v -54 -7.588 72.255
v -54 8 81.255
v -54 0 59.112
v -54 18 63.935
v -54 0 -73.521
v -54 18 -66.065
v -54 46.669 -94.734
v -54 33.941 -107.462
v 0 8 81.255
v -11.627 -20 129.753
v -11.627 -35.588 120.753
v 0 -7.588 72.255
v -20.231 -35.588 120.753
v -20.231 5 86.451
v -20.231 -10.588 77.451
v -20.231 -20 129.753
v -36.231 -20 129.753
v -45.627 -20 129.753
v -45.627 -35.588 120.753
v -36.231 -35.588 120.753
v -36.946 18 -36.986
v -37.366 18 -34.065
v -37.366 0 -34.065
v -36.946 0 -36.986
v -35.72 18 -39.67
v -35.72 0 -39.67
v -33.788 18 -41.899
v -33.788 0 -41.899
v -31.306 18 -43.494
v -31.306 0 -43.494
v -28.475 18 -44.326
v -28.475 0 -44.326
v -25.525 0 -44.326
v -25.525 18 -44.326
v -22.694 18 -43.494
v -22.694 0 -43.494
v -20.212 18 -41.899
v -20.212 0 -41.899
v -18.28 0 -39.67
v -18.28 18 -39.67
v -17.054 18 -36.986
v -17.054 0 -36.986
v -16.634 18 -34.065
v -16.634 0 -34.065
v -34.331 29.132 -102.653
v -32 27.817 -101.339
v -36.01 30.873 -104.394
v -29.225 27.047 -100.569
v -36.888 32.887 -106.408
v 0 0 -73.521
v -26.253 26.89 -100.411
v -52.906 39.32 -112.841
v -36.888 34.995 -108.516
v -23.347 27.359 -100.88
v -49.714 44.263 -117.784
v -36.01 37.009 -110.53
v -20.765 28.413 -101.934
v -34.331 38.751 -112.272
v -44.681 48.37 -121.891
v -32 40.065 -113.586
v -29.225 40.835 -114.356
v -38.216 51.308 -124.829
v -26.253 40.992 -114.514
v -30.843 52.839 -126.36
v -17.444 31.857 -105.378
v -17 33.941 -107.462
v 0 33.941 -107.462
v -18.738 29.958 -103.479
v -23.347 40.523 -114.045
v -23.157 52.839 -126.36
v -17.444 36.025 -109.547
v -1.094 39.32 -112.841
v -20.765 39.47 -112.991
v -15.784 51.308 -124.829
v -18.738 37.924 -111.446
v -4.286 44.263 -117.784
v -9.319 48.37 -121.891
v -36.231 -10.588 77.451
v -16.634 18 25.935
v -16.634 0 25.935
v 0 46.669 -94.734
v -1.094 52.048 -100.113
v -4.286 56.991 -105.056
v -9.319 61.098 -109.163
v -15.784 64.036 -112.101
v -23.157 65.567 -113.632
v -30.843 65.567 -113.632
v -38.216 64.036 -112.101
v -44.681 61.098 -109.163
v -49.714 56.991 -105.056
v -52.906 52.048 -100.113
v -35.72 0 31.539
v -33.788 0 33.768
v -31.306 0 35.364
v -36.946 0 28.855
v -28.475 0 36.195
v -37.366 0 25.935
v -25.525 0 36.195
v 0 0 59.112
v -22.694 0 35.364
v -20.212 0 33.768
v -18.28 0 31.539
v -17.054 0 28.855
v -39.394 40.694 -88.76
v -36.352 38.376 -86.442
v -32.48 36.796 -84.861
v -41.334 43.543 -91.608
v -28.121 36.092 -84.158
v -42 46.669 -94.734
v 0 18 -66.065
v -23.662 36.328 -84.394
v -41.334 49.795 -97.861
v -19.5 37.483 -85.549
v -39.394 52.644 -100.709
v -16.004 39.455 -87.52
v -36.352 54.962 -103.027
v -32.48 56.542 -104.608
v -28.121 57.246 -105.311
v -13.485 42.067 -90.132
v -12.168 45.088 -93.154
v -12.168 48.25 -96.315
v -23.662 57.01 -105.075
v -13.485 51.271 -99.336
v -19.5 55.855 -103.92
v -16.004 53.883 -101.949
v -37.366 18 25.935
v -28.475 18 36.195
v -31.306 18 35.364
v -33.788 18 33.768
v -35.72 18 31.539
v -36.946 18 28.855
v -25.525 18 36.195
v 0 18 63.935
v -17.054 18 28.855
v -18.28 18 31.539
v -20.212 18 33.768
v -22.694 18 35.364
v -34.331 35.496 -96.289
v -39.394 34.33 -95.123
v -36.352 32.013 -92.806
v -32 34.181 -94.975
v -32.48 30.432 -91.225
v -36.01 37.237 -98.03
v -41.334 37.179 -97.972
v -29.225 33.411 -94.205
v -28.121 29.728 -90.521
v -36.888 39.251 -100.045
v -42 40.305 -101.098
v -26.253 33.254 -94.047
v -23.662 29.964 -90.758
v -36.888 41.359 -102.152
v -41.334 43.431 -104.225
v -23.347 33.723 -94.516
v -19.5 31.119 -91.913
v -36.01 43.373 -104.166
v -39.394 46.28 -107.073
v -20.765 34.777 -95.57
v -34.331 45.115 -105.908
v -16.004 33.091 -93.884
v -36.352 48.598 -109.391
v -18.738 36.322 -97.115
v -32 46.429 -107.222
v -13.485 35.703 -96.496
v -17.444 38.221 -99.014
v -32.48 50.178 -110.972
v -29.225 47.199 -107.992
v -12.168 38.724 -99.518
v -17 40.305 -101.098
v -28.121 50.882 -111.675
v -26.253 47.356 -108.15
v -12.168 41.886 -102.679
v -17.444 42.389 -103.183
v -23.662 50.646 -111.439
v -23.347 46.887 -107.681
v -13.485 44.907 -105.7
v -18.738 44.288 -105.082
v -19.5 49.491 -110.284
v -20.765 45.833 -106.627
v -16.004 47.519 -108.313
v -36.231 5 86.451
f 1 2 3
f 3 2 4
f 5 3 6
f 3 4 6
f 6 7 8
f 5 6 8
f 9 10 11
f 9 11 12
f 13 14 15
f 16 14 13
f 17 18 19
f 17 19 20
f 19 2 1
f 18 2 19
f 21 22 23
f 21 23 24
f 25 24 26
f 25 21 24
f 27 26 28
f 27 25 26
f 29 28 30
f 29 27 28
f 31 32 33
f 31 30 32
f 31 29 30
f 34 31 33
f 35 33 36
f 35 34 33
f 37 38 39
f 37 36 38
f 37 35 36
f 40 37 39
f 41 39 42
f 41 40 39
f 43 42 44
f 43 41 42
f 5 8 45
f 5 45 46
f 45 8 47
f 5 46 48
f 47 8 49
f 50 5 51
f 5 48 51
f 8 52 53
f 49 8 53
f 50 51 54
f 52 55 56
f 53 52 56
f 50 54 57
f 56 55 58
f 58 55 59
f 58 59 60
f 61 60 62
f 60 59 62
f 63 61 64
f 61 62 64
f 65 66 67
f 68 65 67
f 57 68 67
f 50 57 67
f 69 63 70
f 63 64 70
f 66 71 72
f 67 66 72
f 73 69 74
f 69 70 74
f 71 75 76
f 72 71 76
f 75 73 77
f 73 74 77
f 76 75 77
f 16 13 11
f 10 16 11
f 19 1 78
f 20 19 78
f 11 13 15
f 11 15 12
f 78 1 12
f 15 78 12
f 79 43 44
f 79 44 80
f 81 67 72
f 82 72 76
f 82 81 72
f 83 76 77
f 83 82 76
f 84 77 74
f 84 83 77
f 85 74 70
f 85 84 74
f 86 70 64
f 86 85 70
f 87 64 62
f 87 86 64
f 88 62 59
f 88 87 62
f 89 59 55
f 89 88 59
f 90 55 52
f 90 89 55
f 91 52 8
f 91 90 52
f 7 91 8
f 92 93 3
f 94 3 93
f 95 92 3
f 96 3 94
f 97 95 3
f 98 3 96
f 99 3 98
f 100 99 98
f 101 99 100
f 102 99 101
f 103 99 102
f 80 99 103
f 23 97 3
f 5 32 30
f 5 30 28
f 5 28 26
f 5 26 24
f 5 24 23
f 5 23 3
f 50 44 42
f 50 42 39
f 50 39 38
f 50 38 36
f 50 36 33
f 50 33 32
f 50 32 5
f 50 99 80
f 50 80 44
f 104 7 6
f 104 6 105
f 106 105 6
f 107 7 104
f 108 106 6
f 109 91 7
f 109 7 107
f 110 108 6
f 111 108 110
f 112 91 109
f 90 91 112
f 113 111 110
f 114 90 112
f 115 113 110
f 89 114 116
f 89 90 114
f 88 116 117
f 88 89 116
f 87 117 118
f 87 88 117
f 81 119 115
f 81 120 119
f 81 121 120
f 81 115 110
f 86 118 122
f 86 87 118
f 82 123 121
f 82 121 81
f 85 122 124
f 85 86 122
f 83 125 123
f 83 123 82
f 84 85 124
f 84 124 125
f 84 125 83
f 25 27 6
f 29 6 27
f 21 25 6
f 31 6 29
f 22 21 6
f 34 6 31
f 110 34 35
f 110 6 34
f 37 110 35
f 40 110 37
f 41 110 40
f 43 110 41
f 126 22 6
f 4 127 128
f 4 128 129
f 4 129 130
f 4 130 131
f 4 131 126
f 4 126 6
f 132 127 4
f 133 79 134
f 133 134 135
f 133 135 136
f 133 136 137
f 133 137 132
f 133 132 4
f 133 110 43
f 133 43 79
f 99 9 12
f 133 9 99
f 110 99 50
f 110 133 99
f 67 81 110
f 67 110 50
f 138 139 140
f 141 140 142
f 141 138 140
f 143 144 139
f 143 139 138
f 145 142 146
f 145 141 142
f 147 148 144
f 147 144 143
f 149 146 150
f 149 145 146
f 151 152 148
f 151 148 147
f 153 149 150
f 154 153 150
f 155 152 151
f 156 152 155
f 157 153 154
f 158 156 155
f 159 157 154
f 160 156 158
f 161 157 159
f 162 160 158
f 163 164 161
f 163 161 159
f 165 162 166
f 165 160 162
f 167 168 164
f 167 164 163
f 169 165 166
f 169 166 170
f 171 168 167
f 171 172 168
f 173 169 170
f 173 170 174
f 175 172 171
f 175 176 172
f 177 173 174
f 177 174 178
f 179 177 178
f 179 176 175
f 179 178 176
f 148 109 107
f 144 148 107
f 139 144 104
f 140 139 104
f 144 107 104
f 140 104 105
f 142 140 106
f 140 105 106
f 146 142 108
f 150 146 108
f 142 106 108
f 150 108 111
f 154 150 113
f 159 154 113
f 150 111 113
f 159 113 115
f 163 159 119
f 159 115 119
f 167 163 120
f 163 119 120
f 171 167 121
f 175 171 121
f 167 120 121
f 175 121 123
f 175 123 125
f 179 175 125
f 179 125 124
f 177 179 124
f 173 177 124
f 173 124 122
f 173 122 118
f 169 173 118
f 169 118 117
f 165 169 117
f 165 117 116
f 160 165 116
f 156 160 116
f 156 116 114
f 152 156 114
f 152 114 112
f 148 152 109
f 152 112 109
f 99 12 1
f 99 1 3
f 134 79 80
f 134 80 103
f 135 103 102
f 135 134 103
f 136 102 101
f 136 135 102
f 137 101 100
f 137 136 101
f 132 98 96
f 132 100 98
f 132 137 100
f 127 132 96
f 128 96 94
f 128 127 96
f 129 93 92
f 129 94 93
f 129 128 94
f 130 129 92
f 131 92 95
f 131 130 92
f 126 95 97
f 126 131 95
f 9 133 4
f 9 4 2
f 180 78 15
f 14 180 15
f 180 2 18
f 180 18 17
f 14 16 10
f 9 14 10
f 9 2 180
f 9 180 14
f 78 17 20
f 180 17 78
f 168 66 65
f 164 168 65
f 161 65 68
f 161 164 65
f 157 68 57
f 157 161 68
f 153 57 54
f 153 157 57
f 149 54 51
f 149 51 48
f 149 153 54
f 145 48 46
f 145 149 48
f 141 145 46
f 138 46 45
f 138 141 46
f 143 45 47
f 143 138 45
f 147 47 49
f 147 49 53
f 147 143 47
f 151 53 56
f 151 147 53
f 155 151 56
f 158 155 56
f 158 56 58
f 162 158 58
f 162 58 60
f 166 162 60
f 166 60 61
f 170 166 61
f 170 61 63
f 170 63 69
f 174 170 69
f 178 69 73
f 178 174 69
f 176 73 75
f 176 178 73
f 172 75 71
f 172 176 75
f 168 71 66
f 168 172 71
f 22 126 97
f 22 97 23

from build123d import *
from build123d.topology import SkipClean

# Parameters (mm, degrees)
BOSS_EXTRUDE1_DEPTH = 54
BOSS_EXTRUDE2_DEPTH = 18
SKETCH4_R           = 27
SKETCH4_R_2         = 15
BOSS_EXTRUDE4_DEPTH = 18
CUT_EXTRUDE1_DEPTH  = 18
BOSS_EXTRUDE5_DEPTH = 18
SKETCH4_6_R         = 15
SKETCH4_6_R_2       = 10
CUT_EXTRUDE2_DEPTH  = 9
CUT_EXTRUDE3_DEPTH  = 151.410913499


with BuildPart() as part:
    # Sketch1 → Boss-Extrude1 (new body)
    with BuildSketch(Plane(origin=(0, 0, 0), x_dir=(0, 0, -1), z_dir=(1, 0, 0))):
        Polygon((-59.11151811, 0), (73.521240549, 0), (107.462366046, 33.941125497), (94.734443984, 46.669047558), (66.065396426, 18), (-63.934603574, 18), (-81.25511165, 8), (-72.25511165, -7.588457268), align=None)
    extrude(amount=-BOSS_EXTRUDE1_DEPTH)

    # Sketch2 → Boss-Extrude2 (add)
    with BuildSketch(Plane(origin=(0, 41.184495438, 23.777879528), x_dir=(1, 0, 0), z_dir=(0, 0.8660254037844378, 0.5000000000000016))):
        Polygon((-11.626654027, -122.368990876), (0, -66.368990876), (-54, -66.368990876), (-45.626654027, -122.368990876), (-36.230586406, -122.368990876), (-36.230586406, -72.368990876), (-20.230586406, -72.368990876), (-20.230586406, -122.368990876), align=None)
    extrude(amount=-BOSS_EXTRUDE2_DEPTH)

    # Sketch4 → Boss-Extrude4 (add)
    with BuildSketch(Plane(origin=(0, -24.032698213, -24.032698213), x_dir=(1, 0, 0), z_dir=(0, 0.7071067811865462, 0.7071067811865489))):
        with Locations((-27, 99.987367753)):
            Circle(SKETCH4_R)
        with Locations((-27, 99.987367753)):
            Circle(SKETCH4_R_2, mode=Mode.SUBTRACT)
    extrude(amount=-BOSS_EXTRUDE4_DEPTH)

    # Sketch4<4> → Cut-Extrude1 (cut)
    with BuildSketch(Plane(origin=(0, -24.032698213, -24.032698213), x_dir=(1, 0, 0), z_dir=(0, 0.7071067811865462, 0.7071067811865489))):
        with BuildLine():
            ThreePointArc((-37, 99.987367753), (-27, 89.987367753), (-17, 99.987367753))
            Line((-17, 99.987367753), (-37, 99.987367753))
        make_face()
    extrude(amount=-CUT_EXTRUDE1_DEPTH, mode=Mode.SUBTRACT)

    # Sketch4<5> → Boss-Extrude5 (add)
    with SkipClean():  # the faces are left unmerged after this step: merging them gives an invalid solid
        with BuildSketch(Plane(origin=(0, -24.032698213, -24.032698213), x_dir=(1, 0, 0), z_dir=(0, 0.7071067811865462, 0.7071067811865489))):
            with BuildLine():
                Line((-17, 99.987367753), (-12, 99.987367753))
                ThreePointArc((-12, 99.987367753), (-27, 114.987367753), (-42, 99.987367753))
                Line((-42, 99.987367753), (-37, 99.987367753))
                ThreePointArc((-37, 99.987367753), (-27, 109.987367753), (-17, 99.987367753))
            make_face()
        extrude(amount=-BOSS_EXTRUDE5_DEPTH)

    # Sketch4<6> → Cut-Extrude2 (cut)
    with SkipClean():  # the faces are left unmerged after this step: merging them gives an invalid solid
        with BuildSketch(Plane(origin=(0, -24.032698213, -24.032698213), x_dir=(1, 0, 0), z_dir=(0, 0.7071067811865462, 0.7071067811865489))):
            with Locations((-27, 99.987367753)):
                Circle(SKETCH4_6_R)
            with Locations((-27, 99.987367753)):
                Circle(SKETCH4_6_R_2, mode=Mode.SUBTRACT)
        extrude(amount=-CUT_EXTRUDE2_DEPTH, mode=Mode.SUBTRACT)

    # Sketch5 → Cut-Extrude3 (cut, through all)
    with SkipClean():  # the faces are left unmerged after this step: merging them gives an invalid solid
        with BuildSketch(Plane(origin=(0, 18, 0), x_dir=(1, 0, 0), z_dir=(0, 1, 0))):
            with BuildLine():
                Line((-37.365679465, 34.065396426), (-37.365679465, -25.934603574))
                ThreePointArc((-37.365679465, -25.934603574), (-27, -36.300283039), (-16.634320535, -25.934603574))
                Line((-16.634320535, -25.934603574), (-16.634320535, 34.065396426))
                ThreePointArc((-16.634320535, 34.065396426), (-27, 44.431075891), (-37.365679465, 34.065396426))
            make_face()
        extrude(amount=-CUT_EXTRUDE3_DEPTH, mode=Mode.SUBTRACT)


solid = part.part
